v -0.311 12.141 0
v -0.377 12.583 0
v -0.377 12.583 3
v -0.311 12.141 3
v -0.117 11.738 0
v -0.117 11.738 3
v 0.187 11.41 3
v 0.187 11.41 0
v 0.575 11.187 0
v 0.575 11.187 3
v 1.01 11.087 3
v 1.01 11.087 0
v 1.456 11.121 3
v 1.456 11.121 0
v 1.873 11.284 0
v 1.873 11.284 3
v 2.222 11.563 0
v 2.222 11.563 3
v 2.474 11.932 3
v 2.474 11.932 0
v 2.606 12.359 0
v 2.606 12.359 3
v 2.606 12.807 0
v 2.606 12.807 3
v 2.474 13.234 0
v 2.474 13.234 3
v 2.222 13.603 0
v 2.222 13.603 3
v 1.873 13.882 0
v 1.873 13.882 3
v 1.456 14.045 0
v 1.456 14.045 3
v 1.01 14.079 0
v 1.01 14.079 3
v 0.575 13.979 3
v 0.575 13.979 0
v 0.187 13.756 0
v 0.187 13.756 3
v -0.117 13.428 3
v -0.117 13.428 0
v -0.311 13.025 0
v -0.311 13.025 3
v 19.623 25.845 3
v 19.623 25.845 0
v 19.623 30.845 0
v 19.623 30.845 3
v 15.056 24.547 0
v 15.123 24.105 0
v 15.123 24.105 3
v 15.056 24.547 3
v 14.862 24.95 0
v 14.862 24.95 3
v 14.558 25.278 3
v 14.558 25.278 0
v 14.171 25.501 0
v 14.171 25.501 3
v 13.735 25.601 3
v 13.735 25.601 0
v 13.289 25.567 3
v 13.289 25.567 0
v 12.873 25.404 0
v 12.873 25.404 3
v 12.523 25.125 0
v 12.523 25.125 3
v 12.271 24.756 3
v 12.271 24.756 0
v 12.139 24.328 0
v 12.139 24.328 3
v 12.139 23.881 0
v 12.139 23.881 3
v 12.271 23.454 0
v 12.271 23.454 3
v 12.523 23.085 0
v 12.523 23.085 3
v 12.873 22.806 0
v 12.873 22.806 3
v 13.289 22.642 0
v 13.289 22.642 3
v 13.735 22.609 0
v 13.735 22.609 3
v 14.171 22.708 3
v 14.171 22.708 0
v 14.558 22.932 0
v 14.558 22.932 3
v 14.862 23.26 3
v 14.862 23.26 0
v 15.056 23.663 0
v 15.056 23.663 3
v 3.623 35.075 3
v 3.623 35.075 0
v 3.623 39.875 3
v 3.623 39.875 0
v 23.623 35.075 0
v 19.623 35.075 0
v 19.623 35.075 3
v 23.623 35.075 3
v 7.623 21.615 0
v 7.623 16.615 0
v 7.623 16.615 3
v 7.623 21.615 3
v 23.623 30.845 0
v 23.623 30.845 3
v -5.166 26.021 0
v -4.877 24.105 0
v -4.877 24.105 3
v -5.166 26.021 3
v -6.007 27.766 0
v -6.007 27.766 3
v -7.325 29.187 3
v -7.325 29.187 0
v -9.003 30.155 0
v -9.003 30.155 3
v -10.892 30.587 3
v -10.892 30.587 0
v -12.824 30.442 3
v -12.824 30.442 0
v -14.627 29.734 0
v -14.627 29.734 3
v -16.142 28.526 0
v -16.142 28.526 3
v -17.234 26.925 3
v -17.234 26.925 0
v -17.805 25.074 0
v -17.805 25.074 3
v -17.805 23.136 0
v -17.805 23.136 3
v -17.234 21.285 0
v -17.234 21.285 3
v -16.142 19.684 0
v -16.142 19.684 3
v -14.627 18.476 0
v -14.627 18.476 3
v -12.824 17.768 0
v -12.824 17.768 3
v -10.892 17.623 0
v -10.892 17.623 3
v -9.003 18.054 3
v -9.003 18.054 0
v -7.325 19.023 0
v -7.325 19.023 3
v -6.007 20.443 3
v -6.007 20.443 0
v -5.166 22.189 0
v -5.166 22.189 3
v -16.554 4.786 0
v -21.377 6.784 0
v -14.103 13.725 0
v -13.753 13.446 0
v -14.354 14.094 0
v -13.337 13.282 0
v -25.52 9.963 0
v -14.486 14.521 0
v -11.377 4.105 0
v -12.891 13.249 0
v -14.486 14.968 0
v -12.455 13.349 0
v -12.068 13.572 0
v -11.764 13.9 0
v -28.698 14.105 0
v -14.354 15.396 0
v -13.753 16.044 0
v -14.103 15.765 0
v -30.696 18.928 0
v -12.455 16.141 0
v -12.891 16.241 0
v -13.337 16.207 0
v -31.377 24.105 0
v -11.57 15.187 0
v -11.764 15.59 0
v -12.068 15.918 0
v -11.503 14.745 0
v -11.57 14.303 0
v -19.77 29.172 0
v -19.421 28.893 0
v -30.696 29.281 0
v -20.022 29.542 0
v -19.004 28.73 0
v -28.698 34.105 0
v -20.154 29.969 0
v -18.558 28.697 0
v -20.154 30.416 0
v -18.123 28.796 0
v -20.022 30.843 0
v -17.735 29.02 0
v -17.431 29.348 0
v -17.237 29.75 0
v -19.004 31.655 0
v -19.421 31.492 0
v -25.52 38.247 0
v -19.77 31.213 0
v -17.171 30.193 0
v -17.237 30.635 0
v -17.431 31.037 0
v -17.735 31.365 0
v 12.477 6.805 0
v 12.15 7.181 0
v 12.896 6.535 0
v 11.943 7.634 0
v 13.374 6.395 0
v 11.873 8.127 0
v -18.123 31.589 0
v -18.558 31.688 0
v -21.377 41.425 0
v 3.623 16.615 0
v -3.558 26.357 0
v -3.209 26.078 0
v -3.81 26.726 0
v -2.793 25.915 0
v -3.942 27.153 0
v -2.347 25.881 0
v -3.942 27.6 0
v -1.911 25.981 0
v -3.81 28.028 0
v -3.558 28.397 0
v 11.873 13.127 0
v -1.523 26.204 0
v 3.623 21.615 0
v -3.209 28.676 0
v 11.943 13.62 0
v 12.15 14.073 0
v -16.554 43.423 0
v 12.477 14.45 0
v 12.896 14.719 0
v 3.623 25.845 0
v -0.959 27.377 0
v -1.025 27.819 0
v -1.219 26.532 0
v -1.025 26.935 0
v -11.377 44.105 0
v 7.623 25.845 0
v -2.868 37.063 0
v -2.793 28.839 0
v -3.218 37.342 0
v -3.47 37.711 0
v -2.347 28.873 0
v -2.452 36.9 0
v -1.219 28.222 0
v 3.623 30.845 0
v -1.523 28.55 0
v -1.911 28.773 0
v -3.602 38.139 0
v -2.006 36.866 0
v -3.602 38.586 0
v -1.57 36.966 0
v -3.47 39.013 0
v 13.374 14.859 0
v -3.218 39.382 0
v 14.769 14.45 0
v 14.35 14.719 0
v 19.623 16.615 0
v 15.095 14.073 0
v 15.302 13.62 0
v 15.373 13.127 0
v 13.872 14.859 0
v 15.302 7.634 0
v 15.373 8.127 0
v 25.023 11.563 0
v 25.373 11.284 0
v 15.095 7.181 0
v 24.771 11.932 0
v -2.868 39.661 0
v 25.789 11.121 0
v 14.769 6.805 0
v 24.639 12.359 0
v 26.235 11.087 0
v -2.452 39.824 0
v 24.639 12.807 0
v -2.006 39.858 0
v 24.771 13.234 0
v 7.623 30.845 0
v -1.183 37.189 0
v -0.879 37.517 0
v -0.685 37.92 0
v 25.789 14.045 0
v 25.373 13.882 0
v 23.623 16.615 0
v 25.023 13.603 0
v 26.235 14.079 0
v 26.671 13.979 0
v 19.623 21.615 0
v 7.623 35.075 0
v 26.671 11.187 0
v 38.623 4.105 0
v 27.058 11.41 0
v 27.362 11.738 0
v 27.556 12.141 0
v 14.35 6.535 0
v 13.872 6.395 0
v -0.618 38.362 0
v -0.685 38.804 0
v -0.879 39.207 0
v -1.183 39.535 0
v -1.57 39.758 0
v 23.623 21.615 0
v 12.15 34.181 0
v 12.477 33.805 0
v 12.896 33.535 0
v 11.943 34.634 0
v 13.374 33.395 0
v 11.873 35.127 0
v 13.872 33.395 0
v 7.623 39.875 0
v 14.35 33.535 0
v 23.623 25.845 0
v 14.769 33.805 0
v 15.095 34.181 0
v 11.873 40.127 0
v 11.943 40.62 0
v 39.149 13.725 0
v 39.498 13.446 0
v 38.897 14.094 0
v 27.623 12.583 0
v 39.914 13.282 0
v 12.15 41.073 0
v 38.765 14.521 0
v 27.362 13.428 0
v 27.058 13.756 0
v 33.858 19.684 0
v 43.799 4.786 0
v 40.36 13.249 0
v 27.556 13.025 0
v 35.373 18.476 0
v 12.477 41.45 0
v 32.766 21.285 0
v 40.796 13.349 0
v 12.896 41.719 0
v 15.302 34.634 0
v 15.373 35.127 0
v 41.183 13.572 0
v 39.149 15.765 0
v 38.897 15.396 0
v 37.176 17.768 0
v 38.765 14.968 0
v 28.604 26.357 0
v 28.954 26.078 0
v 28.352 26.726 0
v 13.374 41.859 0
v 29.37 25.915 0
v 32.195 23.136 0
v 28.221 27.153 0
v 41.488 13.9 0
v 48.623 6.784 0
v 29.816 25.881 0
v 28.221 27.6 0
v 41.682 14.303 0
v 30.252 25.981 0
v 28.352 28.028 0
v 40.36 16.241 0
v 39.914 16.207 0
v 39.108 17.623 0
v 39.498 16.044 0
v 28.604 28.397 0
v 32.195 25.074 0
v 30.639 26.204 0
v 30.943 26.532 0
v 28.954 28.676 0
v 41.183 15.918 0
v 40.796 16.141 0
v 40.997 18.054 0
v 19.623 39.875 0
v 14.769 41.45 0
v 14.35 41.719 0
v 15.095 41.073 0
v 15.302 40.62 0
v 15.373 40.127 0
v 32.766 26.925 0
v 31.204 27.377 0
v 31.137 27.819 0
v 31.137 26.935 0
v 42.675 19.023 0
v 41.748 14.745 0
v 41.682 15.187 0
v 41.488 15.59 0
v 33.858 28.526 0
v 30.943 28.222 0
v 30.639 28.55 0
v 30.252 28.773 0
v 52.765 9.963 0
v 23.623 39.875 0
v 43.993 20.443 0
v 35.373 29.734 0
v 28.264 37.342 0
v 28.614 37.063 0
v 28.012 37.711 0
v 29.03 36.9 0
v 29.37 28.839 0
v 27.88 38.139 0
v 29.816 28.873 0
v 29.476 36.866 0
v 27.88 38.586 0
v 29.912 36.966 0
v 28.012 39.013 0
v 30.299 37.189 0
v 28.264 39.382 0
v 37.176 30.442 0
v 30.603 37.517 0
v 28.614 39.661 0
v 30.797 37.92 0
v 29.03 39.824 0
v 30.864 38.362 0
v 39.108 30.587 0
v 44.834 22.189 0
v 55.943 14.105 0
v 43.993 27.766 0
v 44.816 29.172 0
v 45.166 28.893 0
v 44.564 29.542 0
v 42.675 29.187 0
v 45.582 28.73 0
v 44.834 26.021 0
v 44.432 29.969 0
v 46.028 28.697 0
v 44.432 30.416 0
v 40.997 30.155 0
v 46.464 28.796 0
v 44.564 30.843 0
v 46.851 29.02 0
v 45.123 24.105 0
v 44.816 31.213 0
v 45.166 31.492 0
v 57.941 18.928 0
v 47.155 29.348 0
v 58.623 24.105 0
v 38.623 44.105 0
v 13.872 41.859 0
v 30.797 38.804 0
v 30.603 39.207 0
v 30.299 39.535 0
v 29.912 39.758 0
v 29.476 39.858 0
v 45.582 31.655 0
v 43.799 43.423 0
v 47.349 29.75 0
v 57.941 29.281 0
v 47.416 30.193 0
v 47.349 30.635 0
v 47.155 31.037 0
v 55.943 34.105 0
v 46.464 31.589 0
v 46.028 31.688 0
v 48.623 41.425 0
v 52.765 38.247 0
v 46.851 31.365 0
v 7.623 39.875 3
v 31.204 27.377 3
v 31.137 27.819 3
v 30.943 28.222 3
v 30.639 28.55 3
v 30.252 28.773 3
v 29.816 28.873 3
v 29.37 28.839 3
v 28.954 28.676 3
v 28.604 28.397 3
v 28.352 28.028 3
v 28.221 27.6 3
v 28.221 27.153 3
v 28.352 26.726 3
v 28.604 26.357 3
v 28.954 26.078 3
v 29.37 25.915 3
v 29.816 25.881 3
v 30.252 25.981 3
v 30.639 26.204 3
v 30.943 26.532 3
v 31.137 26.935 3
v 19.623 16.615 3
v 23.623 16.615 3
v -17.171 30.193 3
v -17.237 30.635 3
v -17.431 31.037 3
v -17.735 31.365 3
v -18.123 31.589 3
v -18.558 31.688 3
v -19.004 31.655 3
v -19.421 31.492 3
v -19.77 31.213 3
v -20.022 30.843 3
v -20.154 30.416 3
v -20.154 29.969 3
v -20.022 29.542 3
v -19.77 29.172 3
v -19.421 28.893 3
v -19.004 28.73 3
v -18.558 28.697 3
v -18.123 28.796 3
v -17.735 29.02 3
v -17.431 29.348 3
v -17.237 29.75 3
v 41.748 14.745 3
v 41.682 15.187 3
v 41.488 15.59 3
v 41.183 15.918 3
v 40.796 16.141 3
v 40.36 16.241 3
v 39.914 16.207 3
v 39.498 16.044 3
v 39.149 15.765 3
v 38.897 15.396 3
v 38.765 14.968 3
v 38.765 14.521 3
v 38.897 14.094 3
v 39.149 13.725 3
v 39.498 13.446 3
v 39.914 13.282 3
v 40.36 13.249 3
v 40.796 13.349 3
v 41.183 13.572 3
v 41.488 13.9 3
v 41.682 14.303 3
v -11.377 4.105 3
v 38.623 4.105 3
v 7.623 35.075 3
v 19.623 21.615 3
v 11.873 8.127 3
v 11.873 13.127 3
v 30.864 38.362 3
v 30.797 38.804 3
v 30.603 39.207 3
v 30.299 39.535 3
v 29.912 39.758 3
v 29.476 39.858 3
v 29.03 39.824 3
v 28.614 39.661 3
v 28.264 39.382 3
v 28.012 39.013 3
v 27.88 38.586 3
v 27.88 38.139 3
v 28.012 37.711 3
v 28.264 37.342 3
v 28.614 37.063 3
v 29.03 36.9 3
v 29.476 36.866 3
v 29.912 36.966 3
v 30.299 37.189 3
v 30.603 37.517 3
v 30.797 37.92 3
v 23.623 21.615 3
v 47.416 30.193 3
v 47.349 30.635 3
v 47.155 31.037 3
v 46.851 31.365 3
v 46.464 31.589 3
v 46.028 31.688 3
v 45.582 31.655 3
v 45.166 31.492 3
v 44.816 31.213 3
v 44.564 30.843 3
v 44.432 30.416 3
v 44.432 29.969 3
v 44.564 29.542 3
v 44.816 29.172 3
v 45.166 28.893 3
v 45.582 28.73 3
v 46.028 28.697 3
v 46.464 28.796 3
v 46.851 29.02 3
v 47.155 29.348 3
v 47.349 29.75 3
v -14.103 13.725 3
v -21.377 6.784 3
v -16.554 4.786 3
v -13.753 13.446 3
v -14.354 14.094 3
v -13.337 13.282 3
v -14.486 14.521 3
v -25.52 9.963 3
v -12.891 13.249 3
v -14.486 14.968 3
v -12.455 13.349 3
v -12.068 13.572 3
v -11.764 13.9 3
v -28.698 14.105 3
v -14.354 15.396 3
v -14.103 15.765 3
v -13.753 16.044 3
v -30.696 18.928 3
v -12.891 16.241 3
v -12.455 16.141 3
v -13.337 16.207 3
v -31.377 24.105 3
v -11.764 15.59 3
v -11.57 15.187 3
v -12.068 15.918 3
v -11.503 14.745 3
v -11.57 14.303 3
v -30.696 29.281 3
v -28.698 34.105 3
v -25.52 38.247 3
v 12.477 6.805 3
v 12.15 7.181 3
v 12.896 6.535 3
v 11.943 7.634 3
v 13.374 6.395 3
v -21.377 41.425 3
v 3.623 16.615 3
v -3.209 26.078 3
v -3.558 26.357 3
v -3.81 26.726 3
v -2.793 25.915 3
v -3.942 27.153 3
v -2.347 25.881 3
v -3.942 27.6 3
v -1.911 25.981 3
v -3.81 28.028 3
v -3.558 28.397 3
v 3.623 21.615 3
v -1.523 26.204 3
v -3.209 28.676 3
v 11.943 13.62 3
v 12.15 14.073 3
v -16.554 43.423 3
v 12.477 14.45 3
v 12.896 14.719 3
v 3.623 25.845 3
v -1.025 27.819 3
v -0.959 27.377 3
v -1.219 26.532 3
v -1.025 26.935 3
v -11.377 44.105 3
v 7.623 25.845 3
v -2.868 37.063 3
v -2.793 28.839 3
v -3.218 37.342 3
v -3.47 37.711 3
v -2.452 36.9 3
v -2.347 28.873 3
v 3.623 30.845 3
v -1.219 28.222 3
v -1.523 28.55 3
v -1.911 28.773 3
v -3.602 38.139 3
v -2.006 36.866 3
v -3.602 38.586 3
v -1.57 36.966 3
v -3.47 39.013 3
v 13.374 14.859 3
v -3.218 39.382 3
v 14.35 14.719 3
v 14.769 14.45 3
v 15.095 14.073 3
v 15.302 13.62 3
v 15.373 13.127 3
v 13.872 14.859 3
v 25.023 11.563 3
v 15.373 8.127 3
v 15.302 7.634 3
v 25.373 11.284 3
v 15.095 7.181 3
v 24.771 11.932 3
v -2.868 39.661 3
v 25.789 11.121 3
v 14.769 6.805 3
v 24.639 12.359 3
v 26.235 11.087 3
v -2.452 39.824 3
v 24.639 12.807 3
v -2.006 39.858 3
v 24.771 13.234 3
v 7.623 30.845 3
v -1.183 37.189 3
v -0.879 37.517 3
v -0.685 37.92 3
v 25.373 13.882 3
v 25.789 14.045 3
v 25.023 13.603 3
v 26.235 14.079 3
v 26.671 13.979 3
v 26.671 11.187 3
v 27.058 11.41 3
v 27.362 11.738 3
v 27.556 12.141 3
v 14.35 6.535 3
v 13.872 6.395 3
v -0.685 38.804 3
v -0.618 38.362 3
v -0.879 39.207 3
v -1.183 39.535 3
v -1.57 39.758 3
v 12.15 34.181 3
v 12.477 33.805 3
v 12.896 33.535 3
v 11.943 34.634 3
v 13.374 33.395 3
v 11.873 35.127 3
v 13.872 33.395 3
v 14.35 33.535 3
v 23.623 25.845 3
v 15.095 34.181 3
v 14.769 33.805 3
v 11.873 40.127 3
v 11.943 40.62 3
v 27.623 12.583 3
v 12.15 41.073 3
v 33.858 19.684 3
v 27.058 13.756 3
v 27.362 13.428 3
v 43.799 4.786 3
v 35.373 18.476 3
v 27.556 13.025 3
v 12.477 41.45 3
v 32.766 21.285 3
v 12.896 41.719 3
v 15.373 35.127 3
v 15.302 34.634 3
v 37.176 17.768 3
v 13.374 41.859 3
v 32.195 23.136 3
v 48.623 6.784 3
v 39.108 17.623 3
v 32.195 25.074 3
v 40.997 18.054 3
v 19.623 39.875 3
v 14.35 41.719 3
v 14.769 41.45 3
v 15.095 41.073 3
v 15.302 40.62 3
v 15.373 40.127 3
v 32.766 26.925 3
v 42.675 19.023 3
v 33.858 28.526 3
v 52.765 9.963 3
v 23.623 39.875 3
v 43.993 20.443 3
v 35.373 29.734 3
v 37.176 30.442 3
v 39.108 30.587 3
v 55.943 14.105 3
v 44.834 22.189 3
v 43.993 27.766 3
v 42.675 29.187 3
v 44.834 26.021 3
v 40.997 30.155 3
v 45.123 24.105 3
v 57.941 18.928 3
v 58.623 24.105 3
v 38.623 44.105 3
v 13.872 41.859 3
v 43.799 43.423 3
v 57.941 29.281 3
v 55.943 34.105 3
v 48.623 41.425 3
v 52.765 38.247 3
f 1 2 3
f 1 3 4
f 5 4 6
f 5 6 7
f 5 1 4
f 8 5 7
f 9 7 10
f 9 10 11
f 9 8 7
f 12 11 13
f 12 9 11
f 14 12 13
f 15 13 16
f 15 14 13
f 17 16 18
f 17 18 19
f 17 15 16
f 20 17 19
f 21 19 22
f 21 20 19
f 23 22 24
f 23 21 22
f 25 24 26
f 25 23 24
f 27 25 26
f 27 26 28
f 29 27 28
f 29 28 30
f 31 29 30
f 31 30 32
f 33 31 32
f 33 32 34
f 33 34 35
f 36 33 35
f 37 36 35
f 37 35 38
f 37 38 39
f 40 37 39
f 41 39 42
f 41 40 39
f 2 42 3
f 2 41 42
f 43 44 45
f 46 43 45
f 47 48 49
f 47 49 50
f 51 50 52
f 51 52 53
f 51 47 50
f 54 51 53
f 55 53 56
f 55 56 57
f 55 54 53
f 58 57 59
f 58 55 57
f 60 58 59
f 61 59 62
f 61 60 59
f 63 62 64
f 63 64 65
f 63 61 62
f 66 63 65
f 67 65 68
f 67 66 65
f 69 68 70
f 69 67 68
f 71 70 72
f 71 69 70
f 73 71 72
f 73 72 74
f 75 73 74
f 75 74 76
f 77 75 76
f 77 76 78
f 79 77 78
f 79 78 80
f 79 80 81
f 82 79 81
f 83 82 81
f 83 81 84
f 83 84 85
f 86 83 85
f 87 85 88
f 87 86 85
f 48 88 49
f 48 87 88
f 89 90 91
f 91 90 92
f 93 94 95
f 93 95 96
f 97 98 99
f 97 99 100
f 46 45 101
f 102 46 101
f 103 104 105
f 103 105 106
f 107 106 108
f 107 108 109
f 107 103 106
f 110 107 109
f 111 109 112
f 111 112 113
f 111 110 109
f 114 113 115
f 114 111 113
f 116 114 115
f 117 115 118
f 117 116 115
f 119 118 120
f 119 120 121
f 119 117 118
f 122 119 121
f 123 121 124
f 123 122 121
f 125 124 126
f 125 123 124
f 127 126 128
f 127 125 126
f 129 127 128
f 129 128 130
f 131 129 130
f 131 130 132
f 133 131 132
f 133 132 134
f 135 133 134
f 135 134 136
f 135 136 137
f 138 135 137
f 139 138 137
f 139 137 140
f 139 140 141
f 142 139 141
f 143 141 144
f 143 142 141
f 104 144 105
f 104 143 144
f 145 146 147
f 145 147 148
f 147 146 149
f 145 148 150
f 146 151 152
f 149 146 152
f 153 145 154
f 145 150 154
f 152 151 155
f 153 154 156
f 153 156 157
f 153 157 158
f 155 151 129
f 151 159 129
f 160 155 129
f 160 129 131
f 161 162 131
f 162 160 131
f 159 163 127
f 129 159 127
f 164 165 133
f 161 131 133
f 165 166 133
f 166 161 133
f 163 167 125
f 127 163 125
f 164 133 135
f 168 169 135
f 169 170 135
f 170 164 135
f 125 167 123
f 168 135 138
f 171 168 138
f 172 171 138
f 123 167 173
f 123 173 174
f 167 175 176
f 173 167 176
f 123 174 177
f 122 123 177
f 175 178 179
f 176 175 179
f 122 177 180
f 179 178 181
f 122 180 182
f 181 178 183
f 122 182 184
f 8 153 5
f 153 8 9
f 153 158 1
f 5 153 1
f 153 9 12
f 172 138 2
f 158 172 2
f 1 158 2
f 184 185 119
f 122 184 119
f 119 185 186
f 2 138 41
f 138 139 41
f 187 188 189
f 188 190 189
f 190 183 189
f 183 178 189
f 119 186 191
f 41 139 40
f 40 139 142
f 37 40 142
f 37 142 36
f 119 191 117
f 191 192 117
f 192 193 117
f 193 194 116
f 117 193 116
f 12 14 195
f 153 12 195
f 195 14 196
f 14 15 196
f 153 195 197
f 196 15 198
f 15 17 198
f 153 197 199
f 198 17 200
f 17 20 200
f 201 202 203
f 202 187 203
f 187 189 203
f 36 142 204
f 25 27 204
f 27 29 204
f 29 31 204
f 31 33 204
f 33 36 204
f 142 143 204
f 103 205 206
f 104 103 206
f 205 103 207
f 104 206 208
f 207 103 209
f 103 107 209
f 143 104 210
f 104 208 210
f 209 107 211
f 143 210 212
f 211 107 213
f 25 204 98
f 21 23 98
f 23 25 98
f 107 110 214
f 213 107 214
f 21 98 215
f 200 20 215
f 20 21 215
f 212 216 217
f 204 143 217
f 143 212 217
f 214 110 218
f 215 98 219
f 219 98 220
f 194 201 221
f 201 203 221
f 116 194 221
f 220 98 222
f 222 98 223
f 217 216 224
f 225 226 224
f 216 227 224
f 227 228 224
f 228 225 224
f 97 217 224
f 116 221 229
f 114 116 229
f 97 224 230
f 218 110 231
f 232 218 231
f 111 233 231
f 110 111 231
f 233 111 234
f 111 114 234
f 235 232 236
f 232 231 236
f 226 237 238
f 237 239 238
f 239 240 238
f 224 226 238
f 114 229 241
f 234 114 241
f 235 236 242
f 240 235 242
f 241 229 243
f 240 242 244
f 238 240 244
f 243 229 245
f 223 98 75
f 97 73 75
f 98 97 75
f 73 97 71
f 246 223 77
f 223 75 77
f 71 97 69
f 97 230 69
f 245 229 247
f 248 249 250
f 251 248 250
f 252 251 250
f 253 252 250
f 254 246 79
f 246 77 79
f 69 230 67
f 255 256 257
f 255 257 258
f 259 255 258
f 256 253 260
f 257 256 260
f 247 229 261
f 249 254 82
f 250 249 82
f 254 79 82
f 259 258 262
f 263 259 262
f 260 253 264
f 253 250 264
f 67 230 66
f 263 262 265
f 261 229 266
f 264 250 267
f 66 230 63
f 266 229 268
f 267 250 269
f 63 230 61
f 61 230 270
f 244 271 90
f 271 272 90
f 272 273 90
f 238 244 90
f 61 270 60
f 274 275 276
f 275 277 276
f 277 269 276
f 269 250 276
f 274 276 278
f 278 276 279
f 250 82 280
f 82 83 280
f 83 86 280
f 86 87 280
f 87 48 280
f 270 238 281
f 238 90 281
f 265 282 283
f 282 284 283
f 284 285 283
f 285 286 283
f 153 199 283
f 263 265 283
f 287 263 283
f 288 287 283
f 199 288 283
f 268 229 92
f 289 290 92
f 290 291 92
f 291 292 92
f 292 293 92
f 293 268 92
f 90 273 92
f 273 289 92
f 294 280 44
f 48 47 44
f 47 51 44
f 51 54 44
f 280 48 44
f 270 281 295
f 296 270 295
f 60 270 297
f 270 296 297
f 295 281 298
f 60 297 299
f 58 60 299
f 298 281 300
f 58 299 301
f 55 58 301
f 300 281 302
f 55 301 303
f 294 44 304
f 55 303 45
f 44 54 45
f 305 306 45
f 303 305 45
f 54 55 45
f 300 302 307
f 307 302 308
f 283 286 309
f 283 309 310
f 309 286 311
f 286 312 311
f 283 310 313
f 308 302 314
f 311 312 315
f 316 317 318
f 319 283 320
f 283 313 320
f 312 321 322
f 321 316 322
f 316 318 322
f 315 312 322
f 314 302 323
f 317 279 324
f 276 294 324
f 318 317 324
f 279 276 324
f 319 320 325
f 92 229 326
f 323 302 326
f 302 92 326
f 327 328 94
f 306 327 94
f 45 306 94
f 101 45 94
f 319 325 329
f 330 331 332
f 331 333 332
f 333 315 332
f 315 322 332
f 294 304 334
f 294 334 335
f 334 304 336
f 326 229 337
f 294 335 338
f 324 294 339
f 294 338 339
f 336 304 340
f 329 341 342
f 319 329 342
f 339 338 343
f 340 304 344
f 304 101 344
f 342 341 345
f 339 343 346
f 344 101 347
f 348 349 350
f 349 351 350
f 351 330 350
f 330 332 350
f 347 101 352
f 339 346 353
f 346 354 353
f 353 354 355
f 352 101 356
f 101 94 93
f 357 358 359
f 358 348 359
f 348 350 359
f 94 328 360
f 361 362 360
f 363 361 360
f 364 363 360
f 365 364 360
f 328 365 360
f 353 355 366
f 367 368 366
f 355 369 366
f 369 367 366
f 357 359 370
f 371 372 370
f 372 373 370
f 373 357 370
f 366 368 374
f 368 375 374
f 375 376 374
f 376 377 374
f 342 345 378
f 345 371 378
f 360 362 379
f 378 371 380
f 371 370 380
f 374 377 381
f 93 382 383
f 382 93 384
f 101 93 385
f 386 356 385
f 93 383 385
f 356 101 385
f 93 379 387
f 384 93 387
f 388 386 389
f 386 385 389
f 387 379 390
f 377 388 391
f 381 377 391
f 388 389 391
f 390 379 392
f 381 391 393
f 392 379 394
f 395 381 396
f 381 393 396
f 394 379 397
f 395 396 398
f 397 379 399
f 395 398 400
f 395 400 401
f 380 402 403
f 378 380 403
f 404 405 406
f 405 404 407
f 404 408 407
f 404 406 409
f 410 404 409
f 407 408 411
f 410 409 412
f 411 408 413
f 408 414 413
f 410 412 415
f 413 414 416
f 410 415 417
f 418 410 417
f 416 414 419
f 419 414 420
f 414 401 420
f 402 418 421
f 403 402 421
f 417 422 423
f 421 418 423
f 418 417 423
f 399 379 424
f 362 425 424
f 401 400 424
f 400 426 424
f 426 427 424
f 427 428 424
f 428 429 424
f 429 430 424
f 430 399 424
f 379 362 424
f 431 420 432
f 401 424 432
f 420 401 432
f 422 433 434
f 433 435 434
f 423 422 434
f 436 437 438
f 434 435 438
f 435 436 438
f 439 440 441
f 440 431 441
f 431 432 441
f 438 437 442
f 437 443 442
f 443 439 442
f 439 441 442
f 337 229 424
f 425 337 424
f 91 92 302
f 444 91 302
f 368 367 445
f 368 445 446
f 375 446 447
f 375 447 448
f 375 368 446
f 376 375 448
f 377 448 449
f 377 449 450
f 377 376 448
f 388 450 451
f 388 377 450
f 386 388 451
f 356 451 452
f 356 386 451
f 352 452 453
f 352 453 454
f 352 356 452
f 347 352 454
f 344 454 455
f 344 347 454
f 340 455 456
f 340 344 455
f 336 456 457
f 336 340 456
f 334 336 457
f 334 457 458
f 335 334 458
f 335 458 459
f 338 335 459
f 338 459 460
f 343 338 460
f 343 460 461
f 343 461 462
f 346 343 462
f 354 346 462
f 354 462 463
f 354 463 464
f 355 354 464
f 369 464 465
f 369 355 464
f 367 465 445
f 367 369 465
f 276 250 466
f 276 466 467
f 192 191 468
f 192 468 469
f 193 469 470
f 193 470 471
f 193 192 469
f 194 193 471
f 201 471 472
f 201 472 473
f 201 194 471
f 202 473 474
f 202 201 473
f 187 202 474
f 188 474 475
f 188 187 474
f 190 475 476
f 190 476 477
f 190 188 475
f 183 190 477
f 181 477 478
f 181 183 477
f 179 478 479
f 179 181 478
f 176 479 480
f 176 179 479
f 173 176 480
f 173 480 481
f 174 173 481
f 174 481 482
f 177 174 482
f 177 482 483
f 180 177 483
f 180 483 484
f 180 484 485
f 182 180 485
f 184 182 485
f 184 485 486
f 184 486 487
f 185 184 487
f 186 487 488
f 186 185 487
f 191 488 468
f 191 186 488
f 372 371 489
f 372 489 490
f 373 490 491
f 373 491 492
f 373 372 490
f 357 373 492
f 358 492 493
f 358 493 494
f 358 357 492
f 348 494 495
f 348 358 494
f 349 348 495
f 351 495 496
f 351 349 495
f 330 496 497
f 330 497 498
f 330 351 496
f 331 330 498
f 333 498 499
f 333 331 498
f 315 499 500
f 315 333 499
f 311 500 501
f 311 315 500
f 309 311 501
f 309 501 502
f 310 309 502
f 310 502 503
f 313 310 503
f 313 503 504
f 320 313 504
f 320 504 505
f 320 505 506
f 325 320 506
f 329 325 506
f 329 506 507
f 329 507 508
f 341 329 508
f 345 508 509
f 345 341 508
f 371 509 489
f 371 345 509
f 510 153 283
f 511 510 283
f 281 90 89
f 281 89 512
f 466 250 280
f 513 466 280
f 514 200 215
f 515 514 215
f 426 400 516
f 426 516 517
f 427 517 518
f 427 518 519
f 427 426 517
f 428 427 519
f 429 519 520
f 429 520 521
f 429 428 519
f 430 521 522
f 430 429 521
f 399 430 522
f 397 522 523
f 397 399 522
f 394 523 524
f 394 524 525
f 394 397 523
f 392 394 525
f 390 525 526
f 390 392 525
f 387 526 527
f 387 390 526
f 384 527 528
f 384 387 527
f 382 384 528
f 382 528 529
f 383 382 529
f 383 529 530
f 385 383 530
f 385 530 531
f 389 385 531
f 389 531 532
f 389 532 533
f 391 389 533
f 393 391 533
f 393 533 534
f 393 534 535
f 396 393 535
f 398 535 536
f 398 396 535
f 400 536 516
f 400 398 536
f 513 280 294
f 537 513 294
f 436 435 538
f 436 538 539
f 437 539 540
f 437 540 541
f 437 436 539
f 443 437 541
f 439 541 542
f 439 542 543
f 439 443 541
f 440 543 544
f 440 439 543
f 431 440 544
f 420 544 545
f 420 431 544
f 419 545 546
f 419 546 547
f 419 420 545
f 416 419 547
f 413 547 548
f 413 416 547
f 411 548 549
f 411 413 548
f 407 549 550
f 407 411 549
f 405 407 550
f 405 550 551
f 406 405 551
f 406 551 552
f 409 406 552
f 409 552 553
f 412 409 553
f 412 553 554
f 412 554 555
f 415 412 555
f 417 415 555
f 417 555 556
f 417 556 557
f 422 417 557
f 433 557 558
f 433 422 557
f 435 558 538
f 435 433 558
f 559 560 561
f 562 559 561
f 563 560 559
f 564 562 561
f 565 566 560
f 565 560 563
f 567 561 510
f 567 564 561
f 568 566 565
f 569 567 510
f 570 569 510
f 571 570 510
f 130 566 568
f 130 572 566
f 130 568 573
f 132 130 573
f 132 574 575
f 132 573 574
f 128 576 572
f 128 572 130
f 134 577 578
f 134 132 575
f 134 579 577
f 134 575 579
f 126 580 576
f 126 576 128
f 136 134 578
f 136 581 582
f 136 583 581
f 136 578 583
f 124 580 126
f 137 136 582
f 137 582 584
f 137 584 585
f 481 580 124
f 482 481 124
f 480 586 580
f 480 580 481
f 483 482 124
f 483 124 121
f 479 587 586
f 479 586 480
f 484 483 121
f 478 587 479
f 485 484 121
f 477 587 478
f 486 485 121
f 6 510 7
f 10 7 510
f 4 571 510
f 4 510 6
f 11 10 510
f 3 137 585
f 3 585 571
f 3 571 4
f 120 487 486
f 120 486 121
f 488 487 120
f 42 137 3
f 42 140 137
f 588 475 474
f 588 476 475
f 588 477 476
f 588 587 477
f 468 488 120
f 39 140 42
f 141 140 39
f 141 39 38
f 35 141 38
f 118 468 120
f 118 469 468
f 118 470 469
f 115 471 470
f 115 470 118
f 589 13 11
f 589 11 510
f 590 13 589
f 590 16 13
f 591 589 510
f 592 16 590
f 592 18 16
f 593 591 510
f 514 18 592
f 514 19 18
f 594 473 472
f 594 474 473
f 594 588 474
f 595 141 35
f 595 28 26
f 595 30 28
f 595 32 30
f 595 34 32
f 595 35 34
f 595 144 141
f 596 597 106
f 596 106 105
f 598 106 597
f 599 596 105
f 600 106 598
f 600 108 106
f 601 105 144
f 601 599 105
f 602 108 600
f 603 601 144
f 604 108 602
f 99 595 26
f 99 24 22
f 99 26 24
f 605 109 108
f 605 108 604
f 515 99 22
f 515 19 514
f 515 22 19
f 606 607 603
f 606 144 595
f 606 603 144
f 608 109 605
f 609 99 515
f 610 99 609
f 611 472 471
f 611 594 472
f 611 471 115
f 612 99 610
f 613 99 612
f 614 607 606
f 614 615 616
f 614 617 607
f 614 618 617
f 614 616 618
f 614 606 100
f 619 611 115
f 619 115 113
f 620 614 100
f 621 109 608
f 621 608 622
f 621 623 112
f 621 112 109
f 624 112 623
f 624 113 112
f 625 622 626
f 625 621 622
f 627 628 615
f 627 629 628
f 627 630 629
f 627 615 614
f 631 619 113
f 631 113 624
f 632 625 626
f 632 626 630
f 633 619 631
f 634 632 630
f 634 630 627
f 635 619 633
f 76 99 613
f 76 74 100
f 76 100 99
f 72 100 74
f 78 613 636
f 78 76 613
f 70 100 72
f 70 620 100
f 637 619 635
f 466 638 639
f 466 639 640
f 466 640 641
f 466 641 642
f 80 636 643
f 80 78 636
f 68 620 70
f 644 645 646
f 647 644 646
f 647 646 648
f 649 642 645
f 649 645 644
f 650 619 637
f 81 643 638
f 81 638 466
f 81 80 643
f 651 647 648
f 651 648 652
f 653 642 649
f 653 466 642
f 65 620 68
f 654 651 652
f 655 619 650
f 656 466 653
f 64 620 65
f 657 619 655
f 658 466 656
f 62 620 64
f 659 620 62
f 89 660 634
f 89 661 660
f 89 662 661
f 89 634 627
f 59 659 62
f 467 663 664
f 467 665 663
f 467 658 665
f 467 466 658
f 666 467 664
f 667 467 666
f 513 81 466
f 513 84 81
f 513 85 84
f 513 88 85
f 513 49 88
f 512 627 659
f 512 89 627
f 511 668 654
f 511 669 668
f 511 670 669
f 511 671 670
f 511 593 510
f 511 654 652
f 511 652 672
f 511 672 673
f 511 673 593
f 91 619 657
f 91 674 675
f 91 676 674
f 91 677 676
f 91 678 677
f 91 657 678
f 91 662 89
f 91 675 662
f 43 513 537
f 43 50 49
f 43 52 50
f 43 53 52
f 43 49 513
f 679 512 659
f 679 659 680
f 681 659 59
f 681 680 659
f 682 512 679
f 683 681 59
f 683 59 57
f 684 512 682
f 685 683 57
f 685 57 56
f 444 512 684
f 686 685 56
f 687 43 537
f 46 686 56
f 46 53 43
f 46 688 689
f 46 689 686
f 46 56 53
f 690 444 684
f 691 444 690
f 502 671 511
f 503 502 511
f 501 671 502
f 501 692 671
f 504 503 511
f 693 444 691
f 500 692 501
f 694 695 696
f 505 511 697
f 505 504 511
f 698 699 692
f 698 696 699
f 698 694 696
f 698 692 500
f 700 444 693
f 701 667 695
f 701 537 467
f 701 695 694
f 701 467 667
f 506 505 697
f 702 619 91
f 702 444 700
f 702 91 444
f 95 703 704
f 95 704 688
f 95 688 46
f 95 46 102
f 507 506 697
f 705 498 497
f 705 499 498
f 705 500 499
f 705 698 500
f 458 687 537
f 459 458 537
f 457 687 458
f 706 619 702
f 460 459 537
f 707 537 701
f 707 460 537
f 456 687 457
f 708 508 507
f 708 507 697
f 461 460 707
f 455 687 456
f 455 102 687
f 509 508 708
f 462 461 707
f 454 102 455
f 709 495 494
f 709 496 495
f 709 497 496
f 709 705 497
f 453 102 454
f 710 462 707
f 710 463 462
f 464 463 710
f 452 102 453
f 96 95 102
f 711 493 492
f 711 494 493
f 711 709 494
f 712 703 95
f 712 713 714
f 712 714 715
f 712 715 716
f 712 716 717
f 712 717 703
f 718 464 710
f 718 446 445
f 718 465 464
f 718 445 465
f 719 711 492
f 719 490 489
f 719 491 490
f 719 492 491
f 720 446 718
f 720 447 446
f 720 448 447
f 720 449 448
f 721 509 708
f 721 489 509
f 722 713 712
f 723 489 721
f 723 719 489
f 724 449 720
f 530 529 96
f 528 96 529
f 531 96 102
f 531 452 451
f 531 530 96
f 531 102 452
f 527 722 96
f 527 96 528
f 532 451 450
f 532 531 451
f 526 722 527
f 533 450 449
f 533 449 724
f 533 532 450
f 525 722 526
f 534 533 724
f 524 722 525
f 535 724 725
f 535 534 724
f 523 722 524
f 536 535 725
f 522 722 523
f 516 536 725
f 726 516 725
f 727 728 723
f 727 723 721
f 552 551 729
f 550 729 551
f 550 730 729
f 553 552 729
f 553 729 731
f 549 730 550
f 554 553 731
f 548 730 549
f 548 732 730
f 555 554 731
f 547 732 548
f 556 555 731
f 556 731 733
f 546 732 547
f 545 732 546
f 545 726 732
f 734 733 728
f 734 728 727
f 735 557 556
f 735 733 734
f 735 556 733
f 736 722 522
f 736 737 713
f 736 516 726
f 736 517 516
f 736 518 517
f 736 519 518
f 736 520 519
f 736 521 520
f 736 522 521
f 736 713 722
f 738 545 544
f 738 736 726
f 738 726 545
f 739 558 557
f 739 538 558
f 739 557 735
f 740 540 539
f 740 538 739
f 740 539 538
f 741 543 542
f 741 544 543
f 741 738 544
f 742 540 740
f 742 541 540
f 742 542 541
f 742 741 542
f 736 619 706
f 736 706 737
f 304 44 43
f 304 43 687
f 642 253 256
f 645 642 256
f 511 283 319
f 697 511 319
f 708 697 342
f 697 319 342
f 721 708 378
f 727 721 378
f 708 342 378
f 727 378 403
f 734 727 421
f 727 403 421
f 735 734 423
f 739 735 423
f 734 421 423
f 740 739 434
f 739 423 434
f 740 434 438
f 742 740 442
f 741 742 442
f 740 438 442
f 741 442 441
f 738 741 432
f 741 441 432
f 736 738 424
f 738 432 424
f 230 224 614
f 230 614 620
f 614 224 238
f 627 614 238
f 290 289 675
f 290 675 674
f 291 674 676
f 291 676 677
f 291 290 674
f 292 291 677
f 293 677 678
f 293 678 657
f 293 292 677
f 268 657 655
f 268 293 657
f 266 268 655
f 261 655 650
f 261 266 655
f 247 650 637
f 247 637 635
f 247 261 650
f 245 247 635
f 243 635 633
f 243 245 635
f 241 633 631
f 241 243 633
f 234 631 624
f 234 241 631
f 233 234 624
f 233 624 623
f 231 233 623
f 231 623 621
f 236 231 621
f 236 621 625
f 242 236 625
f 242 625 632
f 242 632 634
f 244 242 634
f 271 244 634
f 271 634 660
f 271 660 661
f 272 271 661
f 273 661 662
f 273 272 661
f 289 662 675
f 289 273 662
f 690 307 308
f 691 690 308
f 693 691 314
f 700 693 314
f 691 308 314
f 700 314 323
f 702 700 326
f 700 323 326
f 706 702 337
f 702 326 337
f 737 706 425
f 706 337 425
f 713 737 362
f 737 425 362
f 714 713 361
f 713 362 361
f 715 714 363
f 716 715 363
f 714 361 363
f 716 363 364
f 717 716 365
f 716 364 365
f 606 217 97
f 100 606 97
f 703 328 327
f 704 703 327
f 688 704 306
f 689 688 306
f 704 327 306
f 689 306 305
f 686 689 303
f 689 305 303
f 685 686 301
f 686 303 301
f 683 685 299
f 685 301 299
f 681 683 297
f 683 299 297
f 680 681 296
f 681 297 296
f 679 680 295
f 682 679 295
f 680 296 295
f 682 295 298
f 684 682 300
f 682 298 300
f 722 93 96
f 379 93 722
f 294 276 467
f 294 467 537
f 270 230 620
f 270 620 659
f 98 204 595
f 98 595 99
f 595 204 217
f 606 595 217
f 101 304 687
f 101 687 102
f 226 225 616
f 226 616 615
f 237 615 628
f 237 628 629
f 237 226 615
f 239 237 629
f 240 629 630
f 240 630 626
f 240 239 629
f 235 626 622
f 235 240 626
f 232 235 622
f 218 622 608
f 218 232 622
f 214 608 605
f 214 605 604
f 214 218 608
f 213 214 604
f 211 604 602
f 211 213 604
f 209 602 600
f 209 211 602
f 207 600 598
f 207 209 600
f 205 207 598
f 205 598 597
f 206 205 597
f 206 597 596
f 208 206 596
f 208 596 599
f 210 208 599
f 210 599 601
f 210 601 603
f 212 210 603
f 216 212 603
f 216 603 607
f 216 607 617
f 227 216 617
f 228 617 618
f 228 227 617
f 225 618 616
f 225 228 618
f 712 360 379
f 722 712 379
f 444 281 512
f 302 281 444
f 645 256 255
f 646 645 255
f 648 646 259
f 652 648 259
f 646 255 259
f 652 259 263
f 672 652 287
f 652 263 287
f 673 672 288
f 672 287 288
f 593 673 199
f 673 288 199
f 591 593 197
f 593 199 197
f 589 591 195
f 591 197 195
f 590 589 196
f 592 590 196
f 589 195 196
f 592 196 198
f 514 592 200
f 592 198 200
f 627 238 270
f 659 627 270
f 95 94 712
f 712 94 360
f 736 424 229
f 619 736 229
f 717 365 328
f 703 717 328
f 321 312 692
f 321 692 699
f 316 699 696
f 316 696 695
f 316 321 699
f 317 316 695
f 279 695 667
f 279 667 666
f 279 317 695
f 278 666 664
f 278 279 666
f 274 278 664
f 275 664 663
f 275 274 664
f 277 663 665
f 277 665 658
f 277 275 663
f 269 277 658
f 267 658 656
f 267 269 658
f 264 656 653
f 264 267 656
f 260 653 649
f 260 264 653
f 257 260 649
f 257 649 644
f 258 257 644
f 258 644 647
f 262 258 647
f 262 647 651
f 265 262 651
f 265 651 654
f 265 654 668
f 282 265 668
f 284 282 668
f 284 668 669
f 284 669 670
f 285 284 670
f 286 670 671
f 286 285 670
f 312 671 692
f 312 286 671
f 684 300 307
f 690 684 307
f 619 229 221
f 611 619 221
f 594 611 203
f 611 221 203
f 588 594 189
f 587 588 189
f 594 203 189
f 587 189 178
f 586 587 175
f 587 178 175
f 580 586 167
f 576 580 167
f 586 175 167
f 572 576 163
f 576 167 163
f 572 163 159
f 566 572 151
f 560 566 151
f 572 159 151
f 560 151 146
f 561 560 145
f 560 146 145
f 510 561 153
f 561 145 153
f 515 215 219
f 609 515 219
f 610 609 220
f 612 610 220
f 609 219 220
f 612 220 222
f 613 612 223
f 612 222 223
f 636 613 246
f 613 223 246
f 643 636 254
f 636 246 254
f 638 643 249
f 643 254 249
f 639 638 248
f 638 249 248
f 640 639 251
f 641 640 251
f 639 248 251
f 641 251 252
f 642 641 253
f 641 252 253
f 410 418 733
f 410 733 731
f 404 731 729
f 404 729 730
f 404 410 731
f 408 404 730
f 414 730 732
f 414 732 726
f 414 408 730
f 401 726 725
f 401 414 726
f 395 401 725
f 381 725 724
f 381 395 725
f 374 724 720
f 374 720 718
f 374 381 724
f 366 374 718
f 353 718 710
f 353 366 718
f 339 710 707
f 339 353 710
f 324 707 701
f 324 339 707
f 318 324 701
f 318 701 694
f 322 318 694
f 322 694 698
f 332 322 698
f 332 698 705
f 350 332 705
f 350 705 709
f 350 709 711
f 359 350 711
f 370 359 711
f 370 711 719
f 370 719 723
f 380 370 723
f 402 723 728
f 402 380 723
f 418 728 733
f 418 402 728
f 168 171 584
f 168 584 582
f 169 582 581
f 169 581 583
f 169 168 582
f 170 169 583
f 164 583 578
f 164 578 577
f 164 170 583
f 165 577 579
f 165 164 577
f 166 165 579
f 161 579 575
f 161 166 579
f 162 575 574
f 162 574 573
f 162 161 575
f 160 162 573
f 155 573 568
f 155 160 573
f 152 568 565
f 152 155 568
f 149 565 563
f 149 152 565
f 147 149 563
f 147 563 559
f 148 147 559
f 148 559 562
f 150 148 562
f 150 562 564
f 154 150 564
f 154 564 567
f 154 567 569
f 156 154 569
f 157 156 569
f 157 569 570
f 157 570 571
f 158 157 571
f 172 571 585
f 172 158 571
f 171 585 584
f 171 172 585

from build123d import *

# Parameters (mm, degrees)
SKETCH_1_R      = 1.5
SKETCH_1_R_2    = 6.5
SKETCH_1_W      = 4
SKETCH_1_H      = 4.8
SKETCH_1_H_2    = 5
EXTRUDE_1_DEPTH = 3


with BuildPart() as part:
    # 草图1 → 凸台-拉伸1 (new body)
    with BuildSketch(Plane.XY):
        with BuildLine():
            Line((38.62258193, 44.104762576), (19.62258193, 44.104762576))
            Line((19.62258193, 44.104762576), (17.62258193, 44.104762576))
            Line((17.62258193, 44.104762576), (9.62258193, 44.104762576))
            Line((9.62258193, 44.104762576), (7.62258193, 44.104762576))
            Line((7.62258193, 44.104762576), (-11.37741807, 44.104762576))
            ThreePointArc((-11.37741807, 44.104762576), (-31.37741807, 24.104762576), (-11.37741807, 4.104762576))
            Line((-11.37741807, 4.104762576), (38.62258193, 4.104762576))
            ThreePointArc((38.62258193, 4.104762576), (58.62258193, 24.104762576), (38.62258193, 44.104762576))
        make_face()
        with Locations((29.703887727, 27.376901588)):
            Circle(SKETCH_1_R, mode=Mode.SUBTRACT)
        with Locations((-2.458723867, 27.376901588)):
            Circle(SKETCH_1_R, mode=Mode.SUBTRACT)
        with Locations((-13.003009663, 14.744877322)):
            Circle(SKETCH_1_R, mode=Mode.SUBTRACT)
        with Locations((-18.670520681, 30.192508819)):
            Circle(SKETCH_1_R, mode=Mode.SUBTRACT)
        with Locations((45.91568454, 30.192508819)):
            Circle(SKETCH_1_R, mode=Mode.SUBTRACT)
        with Locations((-11.37741807, 24.104762576)):
            Circle(SKETCH_1_R_2, mode=Mode.SUBTRACT)
        with Locations((38.62258193, 24.104762576)):
            Circle(SKETCH_1_R_2, mode=Mode.SUBTRACT)
        with Locations((29.363598717, 38.36208455)):
            Circle(SKETCH_1_R, mode=Mode.SUBTRACT)
        with Locations((13.62258193, 24.104762576)):
            Circle(SKETCH_1_R, mode=Mode.SUBTRACT)
        with Locations((-2.118434858, 38.36208455)):
            Circle(SKETCH_1_R, mode=Mode.SUBTRACT)
        with Locations((40.248173522, 14.744877322)):
            Circle(SKETCH_1_R, mode=Mode.SUBTRACT)
        with Locations((26.12258193, 12.583043954)):
            Circle(SKETCH_1_R, mode=Mode.SUBTRACT)
        with Locations(Location((1.12258193, 12.583043954, 0), (0, 0, 180))):
            Circle(SKETCH_1_R, mode=Mode.SUBTRACT)
        with Locations((21.62258193, 37.474762576)):
            Rectangle(SKETCH_1_W, SKETCH_1_H, mode=Mode.SUBTRACT)
        with Locations((21.62258193, 28.344762576)):
            Rectangle(SKETCH_1_W, SKETCH_1_H_2, mode=Mode.SUBTRACT)
        with Locations((5.62258193, 37.474762576)):
            Rectangle(SKETCH_1_W, SKETCH_1_H, mode=Mode.SUBTRACT)
        with Locations((5.62258193, 28.344762576)):
            Rectangle(SKETCH_1_W, SKETCH_1_H_2, mode=Mode.SUBTRACT)
        with Locations((5.62258193, 19.114762576)):
            Rectangle(SKETCH_1_W, SKETCH_1_H_2, mode=Mode.SUBTRACT)
        with Locations((21.62258193, 19.114762576)):
            Rectangle(SKETCH_1_W, SKETCH_1_H_2, mode=Mode.SUBTRACT)
        with BuildLine():
            Line((11.87258193, 8.127075217), (11.87258193, 13.127075217))
            ThreePointArc((11.87258193, 13.127075217), (13.62258193, 14.877075217), (15.37258193, 13.127075217))
            Line((15.37258193, 13.127075217), (15.37258193, 8.127075217))
            ThreePointArc((15.37258193, 8.127075217), (13.62258193, 6.377075217), (11.87258193, 8.127075217))
        make_face(mode=Mode.SUBTRACT)
        with BuildLine():
            Line((15.37258193, 40.127075217), (15.37258193, 35.127075217))
            ThreePointArc((15.37258193, 35.127075217), (13.62258193, 33.377075217), (11.87258193, 35.127075217))
            Line((11.87258193, 35.127075217), (11.87258193, 40.127075217))
            ThreePointArc((11.87258193, 40.127075217), (13.62258193, 41.877075217), (15.37258193, 40.127075217))
        make_face(mode=Mode.SUBTRACT)
    extrude(amount=EXTRUDE_1_DEPTH)


solid = part.part
